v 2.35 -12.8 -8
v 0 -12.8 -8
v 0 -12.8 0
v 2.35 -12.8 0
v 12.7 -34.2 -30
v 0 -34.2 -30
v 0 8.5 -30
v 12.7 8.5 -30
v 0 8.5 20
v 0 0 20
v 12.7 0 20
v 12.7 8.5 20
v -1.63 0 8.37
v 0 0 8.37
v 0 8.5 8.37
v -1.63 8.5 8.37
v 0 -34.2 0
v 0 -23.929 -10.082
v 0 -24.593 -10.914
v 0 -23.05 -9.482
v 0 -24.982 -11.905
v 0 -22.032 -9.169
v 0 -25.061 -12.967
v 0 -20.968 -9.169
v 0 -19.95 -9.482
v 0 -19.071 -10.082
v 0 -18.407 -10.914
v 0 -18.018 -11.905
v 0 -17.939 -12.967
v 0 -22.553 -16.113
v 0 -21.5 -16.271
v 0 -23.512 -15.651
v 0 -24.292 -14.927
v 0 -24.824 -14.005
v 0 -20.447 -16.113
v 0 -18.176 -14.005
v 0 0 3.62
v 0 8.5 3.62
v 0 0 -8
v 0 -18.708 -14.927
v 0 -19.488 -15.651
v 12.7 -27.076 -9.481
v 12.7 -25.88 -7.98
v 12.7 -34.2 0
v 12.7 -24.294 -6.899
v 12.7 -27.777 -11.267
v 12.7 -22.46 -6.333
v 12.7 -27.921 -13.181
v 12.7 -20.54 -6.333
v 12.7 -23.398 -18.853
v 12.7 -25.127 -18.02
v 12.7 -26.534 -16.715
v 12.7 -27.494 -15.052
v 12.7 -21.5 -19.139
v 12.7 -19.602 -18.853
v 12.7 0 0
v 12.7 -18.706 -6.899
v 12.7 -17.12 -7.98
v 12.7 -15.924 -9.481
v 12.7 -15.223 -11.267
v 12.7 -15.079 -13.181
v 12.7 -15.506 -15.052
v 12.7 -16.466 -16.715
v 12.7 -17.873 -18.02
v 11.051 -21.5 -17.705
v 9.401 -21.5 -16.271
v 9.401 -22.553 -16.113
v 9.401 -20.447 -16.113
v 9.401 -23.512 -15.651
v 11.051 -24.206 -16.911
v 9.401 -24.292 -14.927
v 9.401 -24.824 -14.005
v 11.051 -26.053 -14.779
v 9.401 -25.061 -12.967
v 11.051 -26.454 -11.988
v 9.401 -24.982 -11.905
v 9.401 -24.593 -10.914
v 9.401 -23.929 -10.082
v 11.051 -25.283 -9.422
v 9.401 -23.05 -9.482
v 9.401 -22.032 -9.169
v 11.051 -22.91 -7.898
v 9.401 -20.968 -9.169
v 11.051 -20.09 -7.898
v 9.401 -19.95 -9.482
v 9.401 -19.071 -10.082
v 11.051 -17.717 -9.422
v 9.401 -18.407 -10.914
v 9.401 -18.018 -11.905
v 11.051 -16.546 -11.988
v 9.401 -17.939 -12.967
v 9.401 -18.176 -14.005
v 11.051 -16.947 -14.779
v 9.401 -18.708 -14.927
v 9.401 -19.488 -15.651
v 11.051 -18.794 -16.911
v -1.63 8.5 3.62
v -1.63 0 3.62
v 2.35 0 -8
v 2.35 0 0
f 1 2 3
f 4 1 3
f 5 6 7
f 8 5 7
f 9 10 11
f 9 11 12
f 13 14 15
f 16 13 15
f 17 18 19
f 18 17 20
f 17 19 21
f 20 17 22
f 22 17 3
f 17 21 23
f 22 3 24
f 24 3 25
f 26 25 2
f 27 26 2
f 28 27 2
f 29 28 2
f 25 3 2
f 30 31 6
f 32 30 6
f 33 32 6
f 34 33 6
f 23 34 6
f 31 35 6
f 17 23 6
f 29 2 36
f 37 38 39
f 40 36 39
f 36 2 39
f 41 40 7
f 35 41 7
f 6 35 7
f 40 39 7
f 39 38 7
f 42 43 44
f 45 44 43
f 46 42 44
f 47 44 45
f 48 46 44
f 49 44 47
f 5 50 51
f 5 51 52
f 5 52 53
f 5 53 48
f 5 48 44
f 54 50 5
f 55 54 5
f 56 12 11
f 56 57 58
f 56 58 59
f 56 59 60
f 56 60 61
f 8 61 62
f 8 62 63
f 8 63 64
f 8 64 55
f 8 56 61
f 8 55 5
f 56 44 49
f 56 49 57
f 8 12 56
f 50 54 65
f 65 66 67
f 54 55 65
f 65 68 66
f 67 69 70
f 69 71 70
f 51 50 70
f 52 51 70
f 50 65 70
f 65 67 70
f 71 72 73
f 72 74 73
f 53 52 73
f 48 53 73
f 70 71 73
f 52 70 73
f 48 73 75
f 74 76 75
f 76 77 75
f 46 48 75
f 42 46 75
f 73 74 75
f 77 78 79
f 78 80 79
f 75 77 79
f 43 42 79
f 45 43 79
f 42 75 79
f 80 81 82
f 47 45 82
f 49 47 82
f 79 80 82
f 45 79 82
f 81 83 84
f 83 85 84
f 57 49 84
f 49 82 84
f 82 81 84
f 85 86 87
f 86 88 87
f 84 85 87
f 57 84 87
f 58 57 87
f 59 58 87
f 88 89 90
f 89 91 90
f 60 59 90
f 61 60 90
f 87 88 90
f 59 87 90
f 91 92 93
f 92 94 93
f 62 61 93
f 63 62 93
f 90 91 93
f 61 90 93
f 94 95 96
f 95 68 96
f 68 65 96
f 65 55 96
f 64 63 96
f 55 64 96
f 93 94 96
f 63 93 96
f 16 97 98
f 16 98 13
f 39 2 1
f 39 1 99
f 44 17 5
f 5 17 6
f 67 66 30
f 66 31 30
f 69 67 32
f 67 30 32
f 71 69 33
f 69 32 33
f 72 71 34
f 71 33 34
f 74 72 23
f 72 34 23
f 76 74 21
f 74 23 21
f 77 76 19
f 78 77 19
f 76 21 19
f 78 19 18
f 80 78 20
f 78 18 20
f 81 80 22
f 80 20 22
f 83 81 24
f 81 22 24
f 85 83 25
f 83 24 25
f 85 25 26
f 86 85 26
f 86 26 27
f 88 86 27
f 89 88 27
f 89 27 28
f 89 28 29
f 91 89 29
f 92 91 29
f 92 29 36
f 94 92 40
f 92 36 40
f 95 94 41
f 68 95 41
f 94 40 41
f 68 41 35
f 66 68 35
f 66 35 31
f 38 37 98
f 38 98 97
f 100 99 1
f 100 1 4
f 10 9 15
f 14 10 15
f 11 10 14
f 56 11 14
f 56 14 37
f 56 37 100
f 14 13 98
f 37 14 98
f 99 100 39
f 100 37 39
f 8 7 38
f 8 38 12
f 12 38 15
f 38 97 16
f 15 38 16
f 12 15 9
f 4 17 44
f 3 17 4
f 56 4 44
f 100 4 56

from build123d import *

# Parameters (mm, degrees)
SKETCH1_W                                        = 30
SKETCH1_H                                        = 42.7
SKETCH1_R                                        = 3.175
SKETCH1_W_2                                      = 20
SKETCH1_H_2                                      = 8.5
BOSS_EXTRUDE1_DEPTH                              = 12.7
CSK_FOR_1_4_FLAT_HEAD_MACHINE_SCREW1_D           = 7.14248
CSK_FOR_1_4_FLAT_HEAD_MACHINE_SCREW1_CSINK_D     = 12.8778
CSK_FOR_1_4_FLAT_HEAD_MACHINE_SCREW1_CSINK_ANGLE = 82
SKETCH3_W                                        = 8
SKETCH3_H                                        = 12.8
CUT_EXTRUDE1_DEPTH                               = 2.35
SKETCH4_W                                        = 4.75
SKETCH4_H                                        = 8.5
BOSS_EXTRUDE2_DEPTH                              = 1.63


with BuildPart() as part:
    # Sketch1 → Boss-Extrude1 (new body)
    with BuildSketch(Plane(origin=(0, 0, 0), x_dir=(0, 0, -1), z_dir=(1, 0, 0))):
        with Locations((15, -12.85)):
            Rectangle(SKETCH1_W, SKETCH1_H)
        with Locations((12.7, -21.5)):
            Circle(SKETCH1_R, mode=Mode.SUBTRACT)
        with Locations((-10, 4.25)):
            Rectangle(SKETCH1_W_2, SKETCH1_H_2)
    extrude(amount=BOSS_EXTRUDE1_DEPTH)

    # CSK for 1/4 Flat Head Machine Screw1 (through all)
    with Locations(Plane(origin=(12.7, -21.5, -12.7), x_dir=(0, 0, 1), z_dir=(1, 0, 0))):
        with Locations((0, 0)):
            CounterSinkHole(CSK_FOR_1_4_FLAT_HEAD_MACHINE_SCREW1_D / 2, CSK_FOR_1_4_FLAT_HEAD_MACHINE_SCREW1_CSINK_D / 2, counter_sink_angle=CSK_FOR_1_4_FLAT_HEAD_MACHINE_SCREW1_CSINK_ANGLE)

    # Sketch3 → Cut-Extrude1 (cut)
    with BuildSketch(Plane.ZY):
        with Locations((-4, -6.4)):
            Rectangle(SKETCH3_W, SKETCH3_H)
    extrude(amount=-CUT_EXTRUDE1_DEPTH, mode=Mode.SUBTRACT)

    # Sketch4 → Boss-Extrude2 (add)
    with BuildSketch(Plane.ZY):
        with Locations((5.995, 4.25)):
            Rectangle(SKETCH4_W, SKETCH4_H)
    extrude(amount=BOSS_EXTRUDE2_DEPTH)


solid = part.part
